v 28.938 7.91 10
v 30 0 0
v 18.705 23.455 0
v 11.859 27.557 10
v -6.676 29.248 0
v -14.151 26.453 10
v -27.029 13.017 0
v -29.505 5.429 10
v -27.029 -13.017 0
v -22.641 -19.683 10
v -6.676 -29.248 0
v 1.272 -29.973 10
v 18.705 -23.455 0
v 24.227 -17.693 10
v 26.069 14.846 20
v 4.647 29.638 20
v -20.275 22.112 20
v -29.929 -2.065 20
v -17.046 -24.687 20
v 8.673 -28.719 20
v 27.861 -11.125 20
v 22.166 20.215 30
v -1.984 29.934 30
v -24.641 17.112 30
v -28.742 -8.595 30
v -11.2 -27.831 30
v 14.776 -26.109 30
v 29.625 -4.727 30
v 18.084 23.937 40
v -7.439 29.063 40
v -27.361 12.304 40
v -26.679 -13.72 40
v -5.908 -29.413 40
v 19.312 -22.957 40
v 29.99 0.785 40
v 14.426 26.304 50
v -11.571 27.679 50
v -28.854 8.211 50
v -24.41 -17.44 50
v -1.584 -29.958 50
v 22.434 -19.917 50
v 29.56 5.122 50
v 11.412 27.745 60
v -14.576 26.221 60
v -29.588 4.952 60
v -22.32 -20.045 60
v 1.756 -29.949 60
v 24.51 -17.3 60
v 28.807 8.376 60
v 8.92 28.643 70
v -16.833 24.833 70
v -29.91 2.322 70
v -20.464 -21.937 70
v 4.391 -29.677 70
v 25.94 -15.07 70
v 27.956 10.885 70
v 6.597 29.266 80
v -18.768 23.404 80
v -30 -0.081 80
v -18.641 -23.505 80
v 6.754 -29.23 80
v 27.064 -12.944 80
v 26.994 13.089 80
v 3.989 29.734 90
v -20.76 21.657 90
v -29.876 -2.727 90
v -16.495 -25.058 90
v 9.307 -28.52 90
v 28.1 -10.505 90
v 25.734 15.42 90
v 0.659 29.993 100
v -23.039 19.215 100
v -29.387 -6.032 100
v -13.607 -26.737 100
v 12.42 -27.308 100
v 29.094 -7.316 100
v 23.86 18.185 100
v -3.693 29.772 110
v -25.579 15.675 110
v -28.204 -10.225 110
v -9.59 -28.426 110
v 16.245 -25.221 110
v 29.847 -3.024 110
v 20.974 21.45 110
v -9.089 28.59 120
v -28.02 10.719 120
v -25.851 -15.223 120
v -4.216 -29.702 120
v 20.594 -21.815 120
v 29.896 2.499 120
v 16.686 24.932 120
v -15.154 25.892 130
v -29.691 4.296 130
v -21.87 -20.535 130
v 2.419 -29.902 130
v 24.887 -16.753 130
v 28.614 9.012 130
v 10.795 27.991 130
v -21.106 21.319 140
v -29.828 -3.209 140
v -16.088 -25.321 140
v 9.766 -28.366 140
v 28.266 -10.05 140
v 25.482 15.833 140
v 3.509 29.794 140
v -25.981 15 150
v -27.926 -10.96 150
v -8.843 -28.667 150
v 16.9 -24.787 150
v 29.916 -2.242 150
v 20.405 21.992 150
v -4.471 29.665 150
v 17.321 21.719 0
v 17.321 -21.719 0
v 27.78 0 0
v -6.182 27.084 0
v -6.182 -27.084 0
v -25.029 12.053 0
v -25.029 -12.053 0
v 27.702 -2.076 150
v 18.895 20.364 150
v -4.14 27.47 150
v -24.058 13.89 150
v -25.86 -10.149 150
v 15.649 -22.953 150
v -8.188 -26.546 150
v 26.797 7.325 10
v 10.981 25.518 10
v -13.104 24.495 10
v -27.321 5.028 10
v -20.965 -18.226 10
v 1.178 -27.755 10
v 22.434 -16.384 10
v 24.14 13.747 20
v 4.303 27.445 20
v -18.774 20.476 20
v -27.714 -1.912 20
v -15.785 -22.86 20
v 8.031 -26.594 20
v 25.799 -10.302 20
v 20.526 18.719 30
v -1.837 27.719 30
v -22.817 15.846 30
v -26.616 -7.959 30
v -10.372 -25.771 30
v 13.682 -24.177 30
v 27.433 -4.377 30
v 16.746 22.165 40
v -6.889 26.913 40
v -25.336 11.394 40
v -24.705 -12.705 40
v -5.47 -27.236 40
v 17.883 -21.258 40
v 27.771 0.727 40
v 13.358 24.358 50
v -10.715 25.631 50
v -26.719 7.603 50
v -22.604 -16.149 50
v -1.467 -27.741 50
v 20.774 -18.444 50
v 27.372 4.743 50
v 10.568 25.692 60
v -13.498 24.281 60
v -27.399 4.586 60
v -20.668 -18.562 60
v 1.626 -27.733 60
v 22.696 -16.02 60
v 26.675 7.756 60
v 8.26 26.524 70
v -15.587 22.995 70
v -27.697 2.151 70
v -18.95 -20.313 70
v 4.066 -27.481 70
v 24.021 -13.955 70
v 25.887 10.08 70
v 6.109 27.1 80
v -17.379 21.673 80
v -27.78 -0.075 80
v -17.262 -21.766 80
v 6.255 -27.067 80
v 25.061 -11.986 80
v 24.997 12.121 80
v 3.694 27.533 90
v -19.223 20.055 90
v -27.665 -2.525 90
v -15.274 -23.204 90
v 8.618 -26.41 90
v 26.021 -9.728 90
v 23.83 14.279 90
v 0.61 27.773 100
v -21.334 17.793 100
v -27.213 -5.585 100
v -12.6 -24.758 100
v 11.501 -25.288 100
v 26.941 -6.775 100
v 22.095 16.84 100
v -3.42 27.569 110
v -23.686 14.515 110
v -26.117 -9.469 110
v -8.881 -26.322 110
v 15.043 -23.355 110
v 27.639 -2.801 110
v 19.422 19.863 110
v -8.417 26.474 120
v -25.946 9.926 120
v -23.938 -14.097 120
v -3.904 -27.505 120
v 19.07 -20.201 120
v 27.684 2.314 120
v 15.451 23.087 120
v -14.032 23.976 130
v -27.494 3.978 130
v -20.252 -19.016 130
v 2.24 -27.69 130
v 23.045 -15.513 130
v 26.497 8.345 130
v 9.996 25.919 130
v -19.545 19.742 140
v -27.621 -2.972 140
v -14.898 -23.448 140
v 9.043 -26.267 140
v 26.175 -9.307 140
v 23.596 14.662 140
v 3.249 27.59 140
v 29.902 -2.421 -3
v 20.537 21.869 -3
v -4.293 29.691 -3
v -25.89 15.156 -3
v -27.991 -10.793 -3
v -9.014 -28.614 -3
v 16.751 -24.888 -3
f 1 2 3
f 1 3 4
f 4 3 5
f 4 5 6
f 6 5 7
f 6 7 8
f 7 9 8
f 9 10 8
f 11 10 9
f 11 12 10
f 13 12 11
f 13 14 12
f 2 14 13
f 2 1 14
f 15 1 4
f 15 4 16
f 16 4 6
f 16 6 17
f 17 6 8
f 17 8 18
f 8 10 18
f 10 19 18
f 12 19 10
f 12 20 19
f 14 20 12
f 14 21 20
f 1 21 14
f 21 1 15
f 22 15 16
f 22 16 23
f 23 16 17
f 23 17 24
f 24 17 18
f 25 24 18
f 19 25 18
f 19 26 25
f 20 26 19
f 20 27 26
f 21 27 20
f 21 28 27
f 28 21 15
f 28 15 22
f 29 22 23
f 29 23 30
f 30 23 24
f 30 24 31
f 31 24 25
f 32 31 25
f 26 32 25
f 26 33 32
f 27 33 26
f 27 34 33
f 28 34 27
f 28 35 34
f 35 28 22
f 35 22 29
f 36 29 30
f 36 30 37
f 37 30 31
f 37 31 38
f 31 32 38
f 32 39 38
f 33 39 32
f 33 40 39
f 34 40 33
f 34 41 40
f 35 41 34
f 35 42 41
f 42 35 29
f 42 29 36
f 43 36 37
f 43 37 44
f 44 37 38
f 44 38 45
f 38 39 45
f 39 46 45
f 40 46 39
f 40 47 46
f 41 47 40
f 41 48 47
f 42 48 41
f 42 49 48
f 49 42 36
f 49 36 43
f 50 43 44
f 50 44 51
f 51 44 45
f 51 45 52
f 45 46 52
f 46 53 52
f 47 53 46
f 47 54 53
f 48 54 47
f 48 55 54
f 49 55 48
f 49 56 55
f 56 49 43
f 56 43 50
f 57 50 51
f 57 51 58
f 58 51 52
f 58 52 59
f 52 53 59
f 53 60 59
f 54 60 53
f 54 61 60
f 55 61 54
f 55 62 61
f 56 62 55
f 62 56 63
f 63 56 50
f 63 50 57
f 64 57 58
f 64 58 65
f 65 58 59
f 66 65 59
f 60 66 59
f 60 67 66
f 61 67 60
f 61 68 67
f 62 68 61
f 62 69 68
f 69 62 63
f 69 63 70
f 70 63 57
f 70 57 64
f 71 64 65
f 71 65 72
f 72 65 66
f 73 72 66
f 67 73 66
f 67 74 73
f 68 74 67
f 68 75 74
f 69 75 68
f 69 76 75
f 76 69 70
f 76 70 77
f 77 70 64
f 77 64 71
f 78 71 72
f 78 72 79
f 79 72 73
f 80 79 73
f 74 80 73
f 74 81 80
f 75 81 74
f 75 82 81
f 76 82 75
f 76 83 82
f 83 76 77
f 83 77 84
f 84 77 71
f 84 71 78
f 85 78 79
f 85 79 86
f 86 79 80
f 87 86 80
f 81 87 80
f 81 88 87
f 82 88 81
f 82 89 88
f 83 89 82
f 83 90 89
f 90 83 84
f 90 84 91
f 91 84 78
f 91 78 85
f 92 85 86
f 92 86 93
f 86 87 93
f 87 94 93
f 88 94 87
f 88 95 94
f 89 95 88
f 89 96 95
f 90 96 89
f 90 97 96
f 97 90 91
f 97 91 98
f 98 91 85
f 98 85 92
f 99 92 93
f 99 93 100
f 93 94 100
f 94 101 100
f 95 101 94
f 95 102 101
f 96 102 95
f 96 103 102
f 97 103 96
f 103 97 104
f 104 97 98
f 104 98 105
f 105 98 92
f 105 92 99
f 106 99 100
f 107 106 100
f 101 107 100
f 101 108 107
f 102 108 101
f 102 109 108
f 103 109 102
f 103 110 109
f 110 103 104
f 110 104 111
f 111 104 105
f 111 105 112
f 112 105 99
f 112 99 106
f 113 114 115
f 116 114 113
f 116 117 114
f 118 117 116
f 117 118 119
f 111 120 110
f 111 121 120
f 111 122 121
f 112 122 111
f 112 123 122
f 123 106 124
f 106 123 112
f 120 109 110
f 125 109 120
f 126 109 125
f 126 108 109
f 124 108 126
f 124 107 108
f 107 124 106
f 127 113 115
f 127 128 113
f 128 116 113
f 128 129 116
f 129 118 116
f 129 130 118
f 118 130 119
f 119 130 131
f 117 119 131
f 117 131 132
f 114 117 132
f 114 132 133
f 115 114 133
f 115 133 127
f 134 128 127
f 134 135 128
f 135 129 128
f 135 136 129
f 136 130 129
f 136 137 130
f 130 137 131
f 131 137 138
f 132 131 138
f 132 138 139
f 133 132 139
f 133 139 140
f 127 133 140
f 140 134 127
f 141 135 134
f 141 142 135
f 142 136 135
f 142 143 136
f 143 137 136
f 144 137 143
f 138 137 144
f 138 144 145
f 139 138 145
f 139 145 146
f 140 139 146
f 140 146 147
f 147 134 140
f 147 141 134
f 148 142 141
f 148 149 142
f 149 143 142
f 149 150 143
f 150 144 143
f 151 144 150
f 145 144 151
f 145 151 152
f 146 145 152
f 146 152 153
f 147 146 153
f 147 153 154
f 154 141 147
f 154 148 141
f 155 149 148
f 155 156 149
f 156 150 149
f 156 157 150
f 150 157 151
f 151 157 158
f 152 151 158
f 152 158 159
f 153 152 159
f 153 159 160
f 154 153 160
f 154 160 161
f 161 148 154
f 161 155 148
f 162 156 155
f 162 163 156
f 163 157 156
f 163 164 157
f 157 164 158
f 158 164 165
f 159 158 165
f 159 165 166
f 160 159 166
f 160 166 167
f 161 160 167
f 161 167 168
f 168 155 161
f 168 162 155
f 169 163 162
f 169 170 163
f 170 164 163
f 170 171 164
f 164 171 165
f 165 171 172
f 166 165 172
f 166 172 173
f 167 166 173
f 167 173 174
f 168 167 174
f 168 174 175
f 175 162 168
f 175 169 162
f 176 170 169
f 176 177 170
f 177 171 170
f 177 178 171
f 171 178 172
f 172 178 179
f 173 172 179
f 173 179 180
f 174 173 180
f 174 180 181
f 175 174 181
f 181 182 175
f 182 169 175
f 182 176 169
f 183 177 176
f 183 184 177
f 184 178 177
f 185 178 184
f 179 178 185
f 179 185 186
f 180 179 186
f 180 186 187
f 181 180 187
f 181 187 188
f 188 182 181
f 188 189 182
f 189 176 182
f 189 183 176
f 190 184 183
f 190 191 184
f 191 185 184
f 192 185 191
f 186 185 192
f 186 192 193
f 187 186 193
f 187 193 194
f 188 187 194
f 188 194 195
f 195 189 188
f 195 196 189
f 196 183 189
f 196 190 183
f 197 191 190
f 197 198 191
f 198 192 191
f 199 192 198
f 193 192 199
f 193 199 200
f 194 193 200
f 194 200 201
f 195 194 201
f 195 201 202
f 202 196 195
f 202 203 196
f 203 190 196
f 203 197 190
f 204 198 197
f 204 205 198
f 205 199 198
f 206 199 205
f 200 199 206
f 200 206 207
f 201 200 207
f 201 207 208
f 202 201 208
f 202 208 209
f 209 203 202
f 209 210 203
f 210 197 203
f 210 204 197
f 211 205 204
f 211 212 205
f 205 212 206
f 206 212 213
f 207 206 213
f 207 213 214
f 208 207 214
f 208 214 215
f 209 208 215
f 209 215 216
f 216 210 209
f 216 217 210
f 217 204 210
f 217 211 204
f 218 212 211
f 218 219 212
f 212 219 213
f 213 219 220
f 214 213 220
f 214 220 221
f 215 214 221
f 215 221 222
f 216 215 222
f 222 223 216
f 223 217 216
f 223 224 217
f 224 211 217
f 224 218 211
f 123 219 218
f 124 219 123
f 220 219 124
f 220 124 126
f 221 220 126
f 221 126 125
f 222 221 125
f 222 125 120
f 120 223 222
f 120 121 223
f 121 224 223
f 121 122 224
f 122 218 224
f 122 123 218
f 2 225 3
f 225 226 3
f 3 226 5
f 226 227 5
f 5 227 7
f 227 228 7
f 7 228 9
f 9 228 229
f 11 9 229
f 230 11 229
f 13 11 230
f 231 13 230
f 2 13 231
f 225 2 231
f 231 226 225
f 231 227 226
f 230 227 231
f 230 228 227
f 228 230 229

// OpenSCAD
//number of sides
sides = 7;
//spacing of Z levels
z_spacing = 10;
//maximum radius, center to outer vertex
m_radius = 30;
//thickness (at thickest part)
thickness = 2;
// number of levels 
nlevel = 15;
//linear phase angle change, determinesm linear twistiness (degrees/unitlength)
phasediff = 1;
//base thickness, if 0 there is no base.
bthick = 3;
//period of wavyness alongz (unitlength), do not make 0
period = 150;
//amplitude of wavyness (degrees), make 0 if you dont want sine component
amplitude = 13;

module makepolyhelix(level,side,spacing,radius,phase,amp,per){// level = # of levels, side = number of sides of polygon, spacing = length between levels, radius = distance from center to vertex of polygon, phase = number of degrees the polygon is rotated on every level, amp is the amplitude of a sin() component, per is the period of that sin component
    points = [for (i = [0:level]) for (j = [0:(side -1)]) [radius*cos(amp*sin(i*spacing*(360/per)) +i*spacing*phase + j*(360/side)),radius*sin(amp*sin(i*spacing*(360/per)) + i*spacing*phase + j*(360/side)),i*spacing] ];
    //generate two triangular faces for each generation of nested for loop, not sure how to make this more readable
    faces = [for (i = [0:(level-1)]) for (j = [0:(side -1)]) each 
        [ [j+(i*side), j+side*(i+1), (j+1)%side+i*side],
        [(j+1)%side+(i*side), j+side*(i+1), ((j+1)%side)+(i+1)*side]]];
    
    bottomface = [for (i = [0:side-1]) i];
    topface = [for (i = [1:side]) side*(level+1)-i];
    
    faces2 = concat(faces,[bottomface],[topface]);
    
    polyhedron(points,faces2);
}

i_radius = m_radius - thickness/cos((360/sides)/2);// calculates inner radius from thickness and outer radius.
            
difference(){
    makepolyhelix(nlevel,sides,z_spacing,m_radius,phasediff,amplitude,period);
    makepolyhelix(nlevel,sides,z_spacing,i_radius,phasediff,amplitude,period);
}
if (bthick > 0){
mirror([0,0,1]){makepolyhelix(1,sides,bthick,m_radius,-phasediff,-amplitude,period);}
}
